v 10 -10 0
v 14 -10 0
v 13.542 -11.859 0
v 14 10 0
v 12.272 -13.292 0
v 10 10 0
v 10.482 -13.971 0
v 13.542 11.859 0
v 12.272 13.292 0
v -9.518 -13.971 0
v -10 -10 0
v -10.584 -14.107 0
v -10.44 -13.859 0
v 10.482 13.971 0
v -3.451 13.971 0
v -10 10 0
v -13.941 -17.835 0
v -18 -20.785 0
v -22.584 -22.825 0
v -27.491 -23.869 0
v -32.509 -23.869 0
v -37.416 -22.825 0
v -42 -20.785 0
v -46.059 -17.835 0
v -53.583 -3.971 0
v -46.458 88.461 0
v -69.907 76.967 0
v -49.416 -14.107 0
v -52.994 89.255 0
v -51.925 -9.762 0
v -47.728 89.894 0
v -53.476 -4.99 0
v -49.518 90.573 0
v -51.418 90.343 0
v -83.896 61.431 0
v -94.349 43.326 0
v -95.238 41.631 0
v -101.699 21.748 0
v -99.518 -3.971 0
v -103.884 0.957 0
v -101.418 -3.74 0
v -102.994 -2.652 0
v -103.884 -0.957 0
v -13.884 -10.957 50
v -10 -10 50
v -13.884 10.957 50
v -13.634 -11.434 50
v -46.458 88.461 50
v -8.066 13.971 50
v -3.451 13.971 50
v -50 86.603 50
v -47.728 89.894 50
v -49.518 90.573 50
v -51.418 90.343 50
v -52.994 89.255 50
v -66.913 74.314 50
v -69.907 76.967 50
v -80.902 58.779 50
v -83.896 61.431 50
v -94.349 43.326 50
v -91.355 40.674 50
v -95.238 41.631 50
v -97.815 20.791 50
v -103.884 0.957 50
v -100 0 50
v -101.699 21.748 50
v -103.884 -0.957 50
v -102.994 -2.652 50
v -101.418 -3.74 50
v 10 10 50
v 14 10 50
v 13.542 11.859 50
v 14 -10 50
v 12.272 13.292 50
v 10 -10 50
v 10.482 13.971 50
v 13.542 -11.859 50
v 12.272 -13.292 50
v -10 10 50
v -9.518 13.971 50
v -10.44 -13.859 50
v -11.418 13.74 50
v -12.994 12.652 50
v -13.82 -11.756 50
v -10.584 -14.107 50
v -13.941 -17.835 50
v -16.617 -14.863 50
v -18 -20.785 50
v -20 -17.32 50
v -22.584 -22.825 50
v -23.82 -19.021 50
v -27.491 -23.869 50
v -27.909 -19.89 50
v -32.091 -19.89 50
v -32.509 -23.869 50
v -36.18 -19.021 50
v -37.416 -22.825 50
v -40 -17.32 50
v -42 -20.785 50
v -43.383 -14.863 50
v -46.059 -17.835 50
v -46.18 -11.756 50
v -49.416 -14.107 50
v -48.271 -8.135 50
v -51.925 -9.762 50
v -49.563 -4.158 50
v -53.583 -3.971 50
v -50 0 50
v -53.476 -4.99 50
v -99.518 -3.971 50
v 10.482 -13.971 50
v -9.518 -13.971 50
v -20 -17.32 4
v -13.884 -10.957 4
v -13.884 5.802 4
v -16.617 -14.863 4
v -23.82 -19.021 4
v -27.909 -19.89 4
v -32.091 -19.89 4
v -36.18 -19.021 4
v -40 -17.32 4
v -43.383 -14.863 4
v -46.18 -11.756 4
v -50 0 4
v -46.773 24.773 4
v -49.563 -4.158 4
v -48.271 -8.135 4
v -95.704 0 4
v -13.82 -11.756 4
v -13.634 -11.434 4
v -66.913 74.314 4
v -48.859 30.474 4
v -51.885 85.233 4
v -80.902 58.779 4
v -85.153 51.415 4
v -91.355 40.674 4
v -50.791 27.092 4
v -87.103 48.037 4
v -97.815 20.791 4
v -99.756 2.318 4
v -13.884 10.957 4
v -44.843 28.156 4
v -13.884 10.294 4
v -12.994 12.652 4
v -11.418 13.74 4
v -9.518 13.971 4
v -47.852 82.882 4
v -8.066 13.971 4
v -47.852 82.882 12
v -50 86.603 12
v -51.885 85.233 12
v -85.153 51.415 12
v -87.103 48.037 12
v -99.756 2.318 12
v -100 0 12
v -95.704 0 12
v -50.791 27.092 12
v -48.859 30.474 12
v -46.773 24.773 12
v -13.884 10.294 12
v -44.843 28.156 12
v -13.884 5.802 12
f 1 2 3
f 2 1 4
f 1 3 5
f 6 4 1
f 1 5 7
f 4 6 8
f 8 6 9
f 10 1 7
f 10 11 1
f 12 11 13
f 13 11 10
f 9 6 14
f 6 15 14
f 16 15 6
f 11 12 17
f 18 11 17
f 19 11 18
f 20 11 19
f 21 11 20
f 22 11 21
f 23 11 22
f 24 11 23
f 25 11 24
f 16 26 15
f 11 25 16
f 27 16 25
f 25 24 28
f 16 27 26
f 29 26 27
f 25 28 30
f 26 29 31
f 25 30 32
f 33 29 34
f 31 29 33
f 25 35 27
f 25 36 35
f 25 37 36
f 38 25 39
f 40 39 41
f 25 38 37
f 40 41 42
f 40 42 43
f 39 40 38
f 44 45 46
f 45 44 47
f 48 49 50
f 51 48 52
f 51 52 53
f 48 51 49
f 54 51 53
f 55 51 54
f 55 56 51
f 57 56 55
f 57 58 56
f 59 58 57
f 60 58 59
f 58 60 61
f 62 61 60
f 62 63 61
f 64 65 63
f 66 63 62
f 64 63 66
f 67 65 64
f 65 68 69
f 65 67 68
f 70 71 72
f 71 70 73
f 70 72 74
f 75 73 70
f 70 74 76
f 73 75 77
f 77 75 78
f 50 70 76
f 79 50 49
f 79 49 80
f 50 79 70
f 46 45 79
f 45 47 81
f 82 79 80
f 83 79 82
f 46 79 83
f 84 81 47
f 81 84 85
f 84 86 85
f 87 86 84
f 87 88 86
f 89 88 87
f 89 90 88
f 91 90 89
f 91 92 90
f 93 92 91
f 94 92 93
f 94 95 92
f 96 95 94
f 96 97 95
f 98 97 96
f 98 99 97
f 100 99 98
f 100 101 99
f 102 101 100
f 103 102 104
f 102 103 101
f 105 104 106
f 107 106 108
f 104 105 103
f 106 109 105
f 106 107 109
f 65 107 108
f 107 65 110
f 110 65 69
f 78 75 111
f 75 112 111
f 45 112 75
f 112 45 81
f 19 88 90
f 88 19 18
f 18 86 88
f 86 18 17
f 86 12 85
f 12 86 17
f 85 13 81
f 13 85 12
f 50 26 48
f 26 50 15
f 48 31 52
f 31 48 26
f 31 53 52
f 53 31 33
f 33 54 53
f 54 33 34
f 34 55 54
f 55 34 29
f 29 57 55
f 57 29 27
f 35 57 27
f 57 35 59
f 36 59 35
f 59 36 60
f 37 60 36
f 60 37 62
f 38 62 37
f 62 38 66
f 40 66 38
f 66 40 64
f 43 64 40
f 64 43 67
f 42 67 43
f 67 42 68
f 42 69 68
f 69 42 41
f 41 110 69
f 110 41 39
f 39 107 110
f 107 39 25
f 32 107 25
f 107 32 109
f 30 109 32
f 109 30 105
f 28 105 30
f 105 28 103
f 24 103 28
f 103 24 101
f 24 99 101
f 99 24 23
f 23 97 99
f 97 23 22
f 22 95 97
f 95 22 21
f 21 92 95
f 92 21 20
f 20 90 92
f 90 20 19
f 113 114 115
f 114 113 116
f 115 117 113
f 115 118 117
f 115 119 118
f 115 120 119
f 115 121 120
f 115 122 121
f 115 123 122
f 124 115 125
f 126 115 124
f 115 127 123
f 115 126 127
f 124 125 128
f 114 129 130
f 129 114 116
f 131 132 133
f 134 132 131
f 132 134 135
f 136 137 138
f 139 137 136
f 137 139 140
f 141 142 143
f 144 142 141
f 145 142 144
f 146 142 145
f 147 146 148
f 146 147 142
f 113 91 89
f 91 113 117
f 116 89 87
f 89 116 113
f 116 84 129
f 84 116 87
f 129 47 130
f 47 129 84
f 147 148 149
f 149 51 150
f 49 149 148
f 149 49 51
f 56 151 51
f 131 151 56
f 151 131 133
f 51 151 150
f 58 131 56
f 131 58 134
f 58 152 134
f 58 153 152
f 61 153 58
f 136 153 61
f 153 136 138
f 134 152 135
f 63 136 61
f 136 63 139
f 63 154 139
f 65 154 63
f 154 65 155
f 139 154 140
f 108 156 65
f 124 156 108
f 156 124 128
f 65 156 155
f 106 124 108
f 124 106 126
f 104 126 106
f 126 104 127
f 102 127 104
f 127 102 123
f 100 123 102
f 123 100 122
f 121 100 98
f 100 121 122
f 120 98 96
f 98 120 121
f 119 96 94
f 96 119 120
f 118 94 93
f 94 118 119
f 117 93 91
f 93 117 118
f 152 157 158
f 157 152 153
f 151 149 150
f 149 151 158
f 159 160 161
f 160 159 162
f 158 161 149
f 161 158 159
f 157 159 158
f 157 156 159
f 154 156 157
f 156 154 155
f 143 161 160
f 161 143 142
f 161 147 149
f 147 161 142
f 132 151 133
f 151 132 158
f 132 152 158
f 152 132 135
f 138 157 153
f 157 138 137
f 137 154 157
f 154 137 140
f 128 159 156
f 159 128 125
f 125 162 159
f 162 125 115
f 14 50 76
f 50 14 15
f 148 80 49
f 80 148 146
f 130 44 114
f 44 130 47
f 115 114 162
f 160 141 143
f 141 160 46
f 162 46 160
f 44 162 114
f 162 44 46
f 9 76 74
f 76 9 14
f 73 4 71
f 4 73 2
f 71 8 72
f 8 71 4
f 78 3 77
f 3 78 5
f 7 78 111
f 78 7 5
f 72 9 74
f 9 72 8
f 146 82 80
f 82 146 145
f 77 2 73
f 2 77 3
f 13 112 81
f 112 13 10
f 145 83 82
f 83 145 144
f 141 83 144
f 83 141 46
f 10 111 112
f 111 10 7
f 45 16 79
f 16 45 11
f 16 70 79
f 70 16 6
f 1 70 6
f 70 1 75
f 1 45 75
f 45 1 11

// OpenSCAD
angle = 60;  // Slice of the pie.
R = 100;
t = 4;
tz = t;

r = 20; //Drop and siphon size.

h = 50;

cd = 20; //Size of center shape.
module centershape() {
    square([cd,cd], center=true);
}

module base2d(t=t) { 
    
    minkowski() {
        intersection() {
            circle(R);
            translate([-R,0]) square(2*[R,R]);
            rotate(180-angle) translate([-R,0]) square(2*[R,R]);
        }
        if(t>0) circle(t);
    }
    translate([-cd/2-r,0]) circle(r + t);
}

side_extra = false;
bottom_extra = true;

hbe = tz + 2*t;
tbe = t;


a = 0;
f=0.6;


// TODO place siphon.

// TODO thicker rims for strength.

difference() {
    union() {
        difference() {
            rotate(a) union() {
                linear_extrude(height=h) base2d();
                // Extras on sides for strength.
                if( side_extra ) for( g= [1, -1]) rotate(g==1  ? 0 : -angle) hull() {
                    translate([0, -g*t, 2*t]) scale([1,1,2]) sphere(t);
                    translate([t-R, -g*f*t, h-3*t]) scale([1,1,2]) sphere(t);
                }
            }
            rotate(a) translate([0,0,tz]) linear_extrude(height=2*h) base2d(t=0);
        }
        if( bottom_extra ) linear_extrude(height = 2*tz + t) {
                hull() {
                    circle(tbe/2);
                    rotate(90 + angle) translate([R, 0]) circle(tbe/2);
                }
                for(a2=[1.5*angle, angle/2]) hull() {
                    rotate(90 + angle) translate([R/2 + t,0]) circle(tbe/2);
                    rotate(90 + a2) translate([R,0]) circle(tbe/2);
                }
            }
        linear_extrude(height=h) minkowski() {
            centershape();
            circle(t);
        }
    }
    translate([0,0,-h]) linear_extrude(height=3*h) centershape();
}
